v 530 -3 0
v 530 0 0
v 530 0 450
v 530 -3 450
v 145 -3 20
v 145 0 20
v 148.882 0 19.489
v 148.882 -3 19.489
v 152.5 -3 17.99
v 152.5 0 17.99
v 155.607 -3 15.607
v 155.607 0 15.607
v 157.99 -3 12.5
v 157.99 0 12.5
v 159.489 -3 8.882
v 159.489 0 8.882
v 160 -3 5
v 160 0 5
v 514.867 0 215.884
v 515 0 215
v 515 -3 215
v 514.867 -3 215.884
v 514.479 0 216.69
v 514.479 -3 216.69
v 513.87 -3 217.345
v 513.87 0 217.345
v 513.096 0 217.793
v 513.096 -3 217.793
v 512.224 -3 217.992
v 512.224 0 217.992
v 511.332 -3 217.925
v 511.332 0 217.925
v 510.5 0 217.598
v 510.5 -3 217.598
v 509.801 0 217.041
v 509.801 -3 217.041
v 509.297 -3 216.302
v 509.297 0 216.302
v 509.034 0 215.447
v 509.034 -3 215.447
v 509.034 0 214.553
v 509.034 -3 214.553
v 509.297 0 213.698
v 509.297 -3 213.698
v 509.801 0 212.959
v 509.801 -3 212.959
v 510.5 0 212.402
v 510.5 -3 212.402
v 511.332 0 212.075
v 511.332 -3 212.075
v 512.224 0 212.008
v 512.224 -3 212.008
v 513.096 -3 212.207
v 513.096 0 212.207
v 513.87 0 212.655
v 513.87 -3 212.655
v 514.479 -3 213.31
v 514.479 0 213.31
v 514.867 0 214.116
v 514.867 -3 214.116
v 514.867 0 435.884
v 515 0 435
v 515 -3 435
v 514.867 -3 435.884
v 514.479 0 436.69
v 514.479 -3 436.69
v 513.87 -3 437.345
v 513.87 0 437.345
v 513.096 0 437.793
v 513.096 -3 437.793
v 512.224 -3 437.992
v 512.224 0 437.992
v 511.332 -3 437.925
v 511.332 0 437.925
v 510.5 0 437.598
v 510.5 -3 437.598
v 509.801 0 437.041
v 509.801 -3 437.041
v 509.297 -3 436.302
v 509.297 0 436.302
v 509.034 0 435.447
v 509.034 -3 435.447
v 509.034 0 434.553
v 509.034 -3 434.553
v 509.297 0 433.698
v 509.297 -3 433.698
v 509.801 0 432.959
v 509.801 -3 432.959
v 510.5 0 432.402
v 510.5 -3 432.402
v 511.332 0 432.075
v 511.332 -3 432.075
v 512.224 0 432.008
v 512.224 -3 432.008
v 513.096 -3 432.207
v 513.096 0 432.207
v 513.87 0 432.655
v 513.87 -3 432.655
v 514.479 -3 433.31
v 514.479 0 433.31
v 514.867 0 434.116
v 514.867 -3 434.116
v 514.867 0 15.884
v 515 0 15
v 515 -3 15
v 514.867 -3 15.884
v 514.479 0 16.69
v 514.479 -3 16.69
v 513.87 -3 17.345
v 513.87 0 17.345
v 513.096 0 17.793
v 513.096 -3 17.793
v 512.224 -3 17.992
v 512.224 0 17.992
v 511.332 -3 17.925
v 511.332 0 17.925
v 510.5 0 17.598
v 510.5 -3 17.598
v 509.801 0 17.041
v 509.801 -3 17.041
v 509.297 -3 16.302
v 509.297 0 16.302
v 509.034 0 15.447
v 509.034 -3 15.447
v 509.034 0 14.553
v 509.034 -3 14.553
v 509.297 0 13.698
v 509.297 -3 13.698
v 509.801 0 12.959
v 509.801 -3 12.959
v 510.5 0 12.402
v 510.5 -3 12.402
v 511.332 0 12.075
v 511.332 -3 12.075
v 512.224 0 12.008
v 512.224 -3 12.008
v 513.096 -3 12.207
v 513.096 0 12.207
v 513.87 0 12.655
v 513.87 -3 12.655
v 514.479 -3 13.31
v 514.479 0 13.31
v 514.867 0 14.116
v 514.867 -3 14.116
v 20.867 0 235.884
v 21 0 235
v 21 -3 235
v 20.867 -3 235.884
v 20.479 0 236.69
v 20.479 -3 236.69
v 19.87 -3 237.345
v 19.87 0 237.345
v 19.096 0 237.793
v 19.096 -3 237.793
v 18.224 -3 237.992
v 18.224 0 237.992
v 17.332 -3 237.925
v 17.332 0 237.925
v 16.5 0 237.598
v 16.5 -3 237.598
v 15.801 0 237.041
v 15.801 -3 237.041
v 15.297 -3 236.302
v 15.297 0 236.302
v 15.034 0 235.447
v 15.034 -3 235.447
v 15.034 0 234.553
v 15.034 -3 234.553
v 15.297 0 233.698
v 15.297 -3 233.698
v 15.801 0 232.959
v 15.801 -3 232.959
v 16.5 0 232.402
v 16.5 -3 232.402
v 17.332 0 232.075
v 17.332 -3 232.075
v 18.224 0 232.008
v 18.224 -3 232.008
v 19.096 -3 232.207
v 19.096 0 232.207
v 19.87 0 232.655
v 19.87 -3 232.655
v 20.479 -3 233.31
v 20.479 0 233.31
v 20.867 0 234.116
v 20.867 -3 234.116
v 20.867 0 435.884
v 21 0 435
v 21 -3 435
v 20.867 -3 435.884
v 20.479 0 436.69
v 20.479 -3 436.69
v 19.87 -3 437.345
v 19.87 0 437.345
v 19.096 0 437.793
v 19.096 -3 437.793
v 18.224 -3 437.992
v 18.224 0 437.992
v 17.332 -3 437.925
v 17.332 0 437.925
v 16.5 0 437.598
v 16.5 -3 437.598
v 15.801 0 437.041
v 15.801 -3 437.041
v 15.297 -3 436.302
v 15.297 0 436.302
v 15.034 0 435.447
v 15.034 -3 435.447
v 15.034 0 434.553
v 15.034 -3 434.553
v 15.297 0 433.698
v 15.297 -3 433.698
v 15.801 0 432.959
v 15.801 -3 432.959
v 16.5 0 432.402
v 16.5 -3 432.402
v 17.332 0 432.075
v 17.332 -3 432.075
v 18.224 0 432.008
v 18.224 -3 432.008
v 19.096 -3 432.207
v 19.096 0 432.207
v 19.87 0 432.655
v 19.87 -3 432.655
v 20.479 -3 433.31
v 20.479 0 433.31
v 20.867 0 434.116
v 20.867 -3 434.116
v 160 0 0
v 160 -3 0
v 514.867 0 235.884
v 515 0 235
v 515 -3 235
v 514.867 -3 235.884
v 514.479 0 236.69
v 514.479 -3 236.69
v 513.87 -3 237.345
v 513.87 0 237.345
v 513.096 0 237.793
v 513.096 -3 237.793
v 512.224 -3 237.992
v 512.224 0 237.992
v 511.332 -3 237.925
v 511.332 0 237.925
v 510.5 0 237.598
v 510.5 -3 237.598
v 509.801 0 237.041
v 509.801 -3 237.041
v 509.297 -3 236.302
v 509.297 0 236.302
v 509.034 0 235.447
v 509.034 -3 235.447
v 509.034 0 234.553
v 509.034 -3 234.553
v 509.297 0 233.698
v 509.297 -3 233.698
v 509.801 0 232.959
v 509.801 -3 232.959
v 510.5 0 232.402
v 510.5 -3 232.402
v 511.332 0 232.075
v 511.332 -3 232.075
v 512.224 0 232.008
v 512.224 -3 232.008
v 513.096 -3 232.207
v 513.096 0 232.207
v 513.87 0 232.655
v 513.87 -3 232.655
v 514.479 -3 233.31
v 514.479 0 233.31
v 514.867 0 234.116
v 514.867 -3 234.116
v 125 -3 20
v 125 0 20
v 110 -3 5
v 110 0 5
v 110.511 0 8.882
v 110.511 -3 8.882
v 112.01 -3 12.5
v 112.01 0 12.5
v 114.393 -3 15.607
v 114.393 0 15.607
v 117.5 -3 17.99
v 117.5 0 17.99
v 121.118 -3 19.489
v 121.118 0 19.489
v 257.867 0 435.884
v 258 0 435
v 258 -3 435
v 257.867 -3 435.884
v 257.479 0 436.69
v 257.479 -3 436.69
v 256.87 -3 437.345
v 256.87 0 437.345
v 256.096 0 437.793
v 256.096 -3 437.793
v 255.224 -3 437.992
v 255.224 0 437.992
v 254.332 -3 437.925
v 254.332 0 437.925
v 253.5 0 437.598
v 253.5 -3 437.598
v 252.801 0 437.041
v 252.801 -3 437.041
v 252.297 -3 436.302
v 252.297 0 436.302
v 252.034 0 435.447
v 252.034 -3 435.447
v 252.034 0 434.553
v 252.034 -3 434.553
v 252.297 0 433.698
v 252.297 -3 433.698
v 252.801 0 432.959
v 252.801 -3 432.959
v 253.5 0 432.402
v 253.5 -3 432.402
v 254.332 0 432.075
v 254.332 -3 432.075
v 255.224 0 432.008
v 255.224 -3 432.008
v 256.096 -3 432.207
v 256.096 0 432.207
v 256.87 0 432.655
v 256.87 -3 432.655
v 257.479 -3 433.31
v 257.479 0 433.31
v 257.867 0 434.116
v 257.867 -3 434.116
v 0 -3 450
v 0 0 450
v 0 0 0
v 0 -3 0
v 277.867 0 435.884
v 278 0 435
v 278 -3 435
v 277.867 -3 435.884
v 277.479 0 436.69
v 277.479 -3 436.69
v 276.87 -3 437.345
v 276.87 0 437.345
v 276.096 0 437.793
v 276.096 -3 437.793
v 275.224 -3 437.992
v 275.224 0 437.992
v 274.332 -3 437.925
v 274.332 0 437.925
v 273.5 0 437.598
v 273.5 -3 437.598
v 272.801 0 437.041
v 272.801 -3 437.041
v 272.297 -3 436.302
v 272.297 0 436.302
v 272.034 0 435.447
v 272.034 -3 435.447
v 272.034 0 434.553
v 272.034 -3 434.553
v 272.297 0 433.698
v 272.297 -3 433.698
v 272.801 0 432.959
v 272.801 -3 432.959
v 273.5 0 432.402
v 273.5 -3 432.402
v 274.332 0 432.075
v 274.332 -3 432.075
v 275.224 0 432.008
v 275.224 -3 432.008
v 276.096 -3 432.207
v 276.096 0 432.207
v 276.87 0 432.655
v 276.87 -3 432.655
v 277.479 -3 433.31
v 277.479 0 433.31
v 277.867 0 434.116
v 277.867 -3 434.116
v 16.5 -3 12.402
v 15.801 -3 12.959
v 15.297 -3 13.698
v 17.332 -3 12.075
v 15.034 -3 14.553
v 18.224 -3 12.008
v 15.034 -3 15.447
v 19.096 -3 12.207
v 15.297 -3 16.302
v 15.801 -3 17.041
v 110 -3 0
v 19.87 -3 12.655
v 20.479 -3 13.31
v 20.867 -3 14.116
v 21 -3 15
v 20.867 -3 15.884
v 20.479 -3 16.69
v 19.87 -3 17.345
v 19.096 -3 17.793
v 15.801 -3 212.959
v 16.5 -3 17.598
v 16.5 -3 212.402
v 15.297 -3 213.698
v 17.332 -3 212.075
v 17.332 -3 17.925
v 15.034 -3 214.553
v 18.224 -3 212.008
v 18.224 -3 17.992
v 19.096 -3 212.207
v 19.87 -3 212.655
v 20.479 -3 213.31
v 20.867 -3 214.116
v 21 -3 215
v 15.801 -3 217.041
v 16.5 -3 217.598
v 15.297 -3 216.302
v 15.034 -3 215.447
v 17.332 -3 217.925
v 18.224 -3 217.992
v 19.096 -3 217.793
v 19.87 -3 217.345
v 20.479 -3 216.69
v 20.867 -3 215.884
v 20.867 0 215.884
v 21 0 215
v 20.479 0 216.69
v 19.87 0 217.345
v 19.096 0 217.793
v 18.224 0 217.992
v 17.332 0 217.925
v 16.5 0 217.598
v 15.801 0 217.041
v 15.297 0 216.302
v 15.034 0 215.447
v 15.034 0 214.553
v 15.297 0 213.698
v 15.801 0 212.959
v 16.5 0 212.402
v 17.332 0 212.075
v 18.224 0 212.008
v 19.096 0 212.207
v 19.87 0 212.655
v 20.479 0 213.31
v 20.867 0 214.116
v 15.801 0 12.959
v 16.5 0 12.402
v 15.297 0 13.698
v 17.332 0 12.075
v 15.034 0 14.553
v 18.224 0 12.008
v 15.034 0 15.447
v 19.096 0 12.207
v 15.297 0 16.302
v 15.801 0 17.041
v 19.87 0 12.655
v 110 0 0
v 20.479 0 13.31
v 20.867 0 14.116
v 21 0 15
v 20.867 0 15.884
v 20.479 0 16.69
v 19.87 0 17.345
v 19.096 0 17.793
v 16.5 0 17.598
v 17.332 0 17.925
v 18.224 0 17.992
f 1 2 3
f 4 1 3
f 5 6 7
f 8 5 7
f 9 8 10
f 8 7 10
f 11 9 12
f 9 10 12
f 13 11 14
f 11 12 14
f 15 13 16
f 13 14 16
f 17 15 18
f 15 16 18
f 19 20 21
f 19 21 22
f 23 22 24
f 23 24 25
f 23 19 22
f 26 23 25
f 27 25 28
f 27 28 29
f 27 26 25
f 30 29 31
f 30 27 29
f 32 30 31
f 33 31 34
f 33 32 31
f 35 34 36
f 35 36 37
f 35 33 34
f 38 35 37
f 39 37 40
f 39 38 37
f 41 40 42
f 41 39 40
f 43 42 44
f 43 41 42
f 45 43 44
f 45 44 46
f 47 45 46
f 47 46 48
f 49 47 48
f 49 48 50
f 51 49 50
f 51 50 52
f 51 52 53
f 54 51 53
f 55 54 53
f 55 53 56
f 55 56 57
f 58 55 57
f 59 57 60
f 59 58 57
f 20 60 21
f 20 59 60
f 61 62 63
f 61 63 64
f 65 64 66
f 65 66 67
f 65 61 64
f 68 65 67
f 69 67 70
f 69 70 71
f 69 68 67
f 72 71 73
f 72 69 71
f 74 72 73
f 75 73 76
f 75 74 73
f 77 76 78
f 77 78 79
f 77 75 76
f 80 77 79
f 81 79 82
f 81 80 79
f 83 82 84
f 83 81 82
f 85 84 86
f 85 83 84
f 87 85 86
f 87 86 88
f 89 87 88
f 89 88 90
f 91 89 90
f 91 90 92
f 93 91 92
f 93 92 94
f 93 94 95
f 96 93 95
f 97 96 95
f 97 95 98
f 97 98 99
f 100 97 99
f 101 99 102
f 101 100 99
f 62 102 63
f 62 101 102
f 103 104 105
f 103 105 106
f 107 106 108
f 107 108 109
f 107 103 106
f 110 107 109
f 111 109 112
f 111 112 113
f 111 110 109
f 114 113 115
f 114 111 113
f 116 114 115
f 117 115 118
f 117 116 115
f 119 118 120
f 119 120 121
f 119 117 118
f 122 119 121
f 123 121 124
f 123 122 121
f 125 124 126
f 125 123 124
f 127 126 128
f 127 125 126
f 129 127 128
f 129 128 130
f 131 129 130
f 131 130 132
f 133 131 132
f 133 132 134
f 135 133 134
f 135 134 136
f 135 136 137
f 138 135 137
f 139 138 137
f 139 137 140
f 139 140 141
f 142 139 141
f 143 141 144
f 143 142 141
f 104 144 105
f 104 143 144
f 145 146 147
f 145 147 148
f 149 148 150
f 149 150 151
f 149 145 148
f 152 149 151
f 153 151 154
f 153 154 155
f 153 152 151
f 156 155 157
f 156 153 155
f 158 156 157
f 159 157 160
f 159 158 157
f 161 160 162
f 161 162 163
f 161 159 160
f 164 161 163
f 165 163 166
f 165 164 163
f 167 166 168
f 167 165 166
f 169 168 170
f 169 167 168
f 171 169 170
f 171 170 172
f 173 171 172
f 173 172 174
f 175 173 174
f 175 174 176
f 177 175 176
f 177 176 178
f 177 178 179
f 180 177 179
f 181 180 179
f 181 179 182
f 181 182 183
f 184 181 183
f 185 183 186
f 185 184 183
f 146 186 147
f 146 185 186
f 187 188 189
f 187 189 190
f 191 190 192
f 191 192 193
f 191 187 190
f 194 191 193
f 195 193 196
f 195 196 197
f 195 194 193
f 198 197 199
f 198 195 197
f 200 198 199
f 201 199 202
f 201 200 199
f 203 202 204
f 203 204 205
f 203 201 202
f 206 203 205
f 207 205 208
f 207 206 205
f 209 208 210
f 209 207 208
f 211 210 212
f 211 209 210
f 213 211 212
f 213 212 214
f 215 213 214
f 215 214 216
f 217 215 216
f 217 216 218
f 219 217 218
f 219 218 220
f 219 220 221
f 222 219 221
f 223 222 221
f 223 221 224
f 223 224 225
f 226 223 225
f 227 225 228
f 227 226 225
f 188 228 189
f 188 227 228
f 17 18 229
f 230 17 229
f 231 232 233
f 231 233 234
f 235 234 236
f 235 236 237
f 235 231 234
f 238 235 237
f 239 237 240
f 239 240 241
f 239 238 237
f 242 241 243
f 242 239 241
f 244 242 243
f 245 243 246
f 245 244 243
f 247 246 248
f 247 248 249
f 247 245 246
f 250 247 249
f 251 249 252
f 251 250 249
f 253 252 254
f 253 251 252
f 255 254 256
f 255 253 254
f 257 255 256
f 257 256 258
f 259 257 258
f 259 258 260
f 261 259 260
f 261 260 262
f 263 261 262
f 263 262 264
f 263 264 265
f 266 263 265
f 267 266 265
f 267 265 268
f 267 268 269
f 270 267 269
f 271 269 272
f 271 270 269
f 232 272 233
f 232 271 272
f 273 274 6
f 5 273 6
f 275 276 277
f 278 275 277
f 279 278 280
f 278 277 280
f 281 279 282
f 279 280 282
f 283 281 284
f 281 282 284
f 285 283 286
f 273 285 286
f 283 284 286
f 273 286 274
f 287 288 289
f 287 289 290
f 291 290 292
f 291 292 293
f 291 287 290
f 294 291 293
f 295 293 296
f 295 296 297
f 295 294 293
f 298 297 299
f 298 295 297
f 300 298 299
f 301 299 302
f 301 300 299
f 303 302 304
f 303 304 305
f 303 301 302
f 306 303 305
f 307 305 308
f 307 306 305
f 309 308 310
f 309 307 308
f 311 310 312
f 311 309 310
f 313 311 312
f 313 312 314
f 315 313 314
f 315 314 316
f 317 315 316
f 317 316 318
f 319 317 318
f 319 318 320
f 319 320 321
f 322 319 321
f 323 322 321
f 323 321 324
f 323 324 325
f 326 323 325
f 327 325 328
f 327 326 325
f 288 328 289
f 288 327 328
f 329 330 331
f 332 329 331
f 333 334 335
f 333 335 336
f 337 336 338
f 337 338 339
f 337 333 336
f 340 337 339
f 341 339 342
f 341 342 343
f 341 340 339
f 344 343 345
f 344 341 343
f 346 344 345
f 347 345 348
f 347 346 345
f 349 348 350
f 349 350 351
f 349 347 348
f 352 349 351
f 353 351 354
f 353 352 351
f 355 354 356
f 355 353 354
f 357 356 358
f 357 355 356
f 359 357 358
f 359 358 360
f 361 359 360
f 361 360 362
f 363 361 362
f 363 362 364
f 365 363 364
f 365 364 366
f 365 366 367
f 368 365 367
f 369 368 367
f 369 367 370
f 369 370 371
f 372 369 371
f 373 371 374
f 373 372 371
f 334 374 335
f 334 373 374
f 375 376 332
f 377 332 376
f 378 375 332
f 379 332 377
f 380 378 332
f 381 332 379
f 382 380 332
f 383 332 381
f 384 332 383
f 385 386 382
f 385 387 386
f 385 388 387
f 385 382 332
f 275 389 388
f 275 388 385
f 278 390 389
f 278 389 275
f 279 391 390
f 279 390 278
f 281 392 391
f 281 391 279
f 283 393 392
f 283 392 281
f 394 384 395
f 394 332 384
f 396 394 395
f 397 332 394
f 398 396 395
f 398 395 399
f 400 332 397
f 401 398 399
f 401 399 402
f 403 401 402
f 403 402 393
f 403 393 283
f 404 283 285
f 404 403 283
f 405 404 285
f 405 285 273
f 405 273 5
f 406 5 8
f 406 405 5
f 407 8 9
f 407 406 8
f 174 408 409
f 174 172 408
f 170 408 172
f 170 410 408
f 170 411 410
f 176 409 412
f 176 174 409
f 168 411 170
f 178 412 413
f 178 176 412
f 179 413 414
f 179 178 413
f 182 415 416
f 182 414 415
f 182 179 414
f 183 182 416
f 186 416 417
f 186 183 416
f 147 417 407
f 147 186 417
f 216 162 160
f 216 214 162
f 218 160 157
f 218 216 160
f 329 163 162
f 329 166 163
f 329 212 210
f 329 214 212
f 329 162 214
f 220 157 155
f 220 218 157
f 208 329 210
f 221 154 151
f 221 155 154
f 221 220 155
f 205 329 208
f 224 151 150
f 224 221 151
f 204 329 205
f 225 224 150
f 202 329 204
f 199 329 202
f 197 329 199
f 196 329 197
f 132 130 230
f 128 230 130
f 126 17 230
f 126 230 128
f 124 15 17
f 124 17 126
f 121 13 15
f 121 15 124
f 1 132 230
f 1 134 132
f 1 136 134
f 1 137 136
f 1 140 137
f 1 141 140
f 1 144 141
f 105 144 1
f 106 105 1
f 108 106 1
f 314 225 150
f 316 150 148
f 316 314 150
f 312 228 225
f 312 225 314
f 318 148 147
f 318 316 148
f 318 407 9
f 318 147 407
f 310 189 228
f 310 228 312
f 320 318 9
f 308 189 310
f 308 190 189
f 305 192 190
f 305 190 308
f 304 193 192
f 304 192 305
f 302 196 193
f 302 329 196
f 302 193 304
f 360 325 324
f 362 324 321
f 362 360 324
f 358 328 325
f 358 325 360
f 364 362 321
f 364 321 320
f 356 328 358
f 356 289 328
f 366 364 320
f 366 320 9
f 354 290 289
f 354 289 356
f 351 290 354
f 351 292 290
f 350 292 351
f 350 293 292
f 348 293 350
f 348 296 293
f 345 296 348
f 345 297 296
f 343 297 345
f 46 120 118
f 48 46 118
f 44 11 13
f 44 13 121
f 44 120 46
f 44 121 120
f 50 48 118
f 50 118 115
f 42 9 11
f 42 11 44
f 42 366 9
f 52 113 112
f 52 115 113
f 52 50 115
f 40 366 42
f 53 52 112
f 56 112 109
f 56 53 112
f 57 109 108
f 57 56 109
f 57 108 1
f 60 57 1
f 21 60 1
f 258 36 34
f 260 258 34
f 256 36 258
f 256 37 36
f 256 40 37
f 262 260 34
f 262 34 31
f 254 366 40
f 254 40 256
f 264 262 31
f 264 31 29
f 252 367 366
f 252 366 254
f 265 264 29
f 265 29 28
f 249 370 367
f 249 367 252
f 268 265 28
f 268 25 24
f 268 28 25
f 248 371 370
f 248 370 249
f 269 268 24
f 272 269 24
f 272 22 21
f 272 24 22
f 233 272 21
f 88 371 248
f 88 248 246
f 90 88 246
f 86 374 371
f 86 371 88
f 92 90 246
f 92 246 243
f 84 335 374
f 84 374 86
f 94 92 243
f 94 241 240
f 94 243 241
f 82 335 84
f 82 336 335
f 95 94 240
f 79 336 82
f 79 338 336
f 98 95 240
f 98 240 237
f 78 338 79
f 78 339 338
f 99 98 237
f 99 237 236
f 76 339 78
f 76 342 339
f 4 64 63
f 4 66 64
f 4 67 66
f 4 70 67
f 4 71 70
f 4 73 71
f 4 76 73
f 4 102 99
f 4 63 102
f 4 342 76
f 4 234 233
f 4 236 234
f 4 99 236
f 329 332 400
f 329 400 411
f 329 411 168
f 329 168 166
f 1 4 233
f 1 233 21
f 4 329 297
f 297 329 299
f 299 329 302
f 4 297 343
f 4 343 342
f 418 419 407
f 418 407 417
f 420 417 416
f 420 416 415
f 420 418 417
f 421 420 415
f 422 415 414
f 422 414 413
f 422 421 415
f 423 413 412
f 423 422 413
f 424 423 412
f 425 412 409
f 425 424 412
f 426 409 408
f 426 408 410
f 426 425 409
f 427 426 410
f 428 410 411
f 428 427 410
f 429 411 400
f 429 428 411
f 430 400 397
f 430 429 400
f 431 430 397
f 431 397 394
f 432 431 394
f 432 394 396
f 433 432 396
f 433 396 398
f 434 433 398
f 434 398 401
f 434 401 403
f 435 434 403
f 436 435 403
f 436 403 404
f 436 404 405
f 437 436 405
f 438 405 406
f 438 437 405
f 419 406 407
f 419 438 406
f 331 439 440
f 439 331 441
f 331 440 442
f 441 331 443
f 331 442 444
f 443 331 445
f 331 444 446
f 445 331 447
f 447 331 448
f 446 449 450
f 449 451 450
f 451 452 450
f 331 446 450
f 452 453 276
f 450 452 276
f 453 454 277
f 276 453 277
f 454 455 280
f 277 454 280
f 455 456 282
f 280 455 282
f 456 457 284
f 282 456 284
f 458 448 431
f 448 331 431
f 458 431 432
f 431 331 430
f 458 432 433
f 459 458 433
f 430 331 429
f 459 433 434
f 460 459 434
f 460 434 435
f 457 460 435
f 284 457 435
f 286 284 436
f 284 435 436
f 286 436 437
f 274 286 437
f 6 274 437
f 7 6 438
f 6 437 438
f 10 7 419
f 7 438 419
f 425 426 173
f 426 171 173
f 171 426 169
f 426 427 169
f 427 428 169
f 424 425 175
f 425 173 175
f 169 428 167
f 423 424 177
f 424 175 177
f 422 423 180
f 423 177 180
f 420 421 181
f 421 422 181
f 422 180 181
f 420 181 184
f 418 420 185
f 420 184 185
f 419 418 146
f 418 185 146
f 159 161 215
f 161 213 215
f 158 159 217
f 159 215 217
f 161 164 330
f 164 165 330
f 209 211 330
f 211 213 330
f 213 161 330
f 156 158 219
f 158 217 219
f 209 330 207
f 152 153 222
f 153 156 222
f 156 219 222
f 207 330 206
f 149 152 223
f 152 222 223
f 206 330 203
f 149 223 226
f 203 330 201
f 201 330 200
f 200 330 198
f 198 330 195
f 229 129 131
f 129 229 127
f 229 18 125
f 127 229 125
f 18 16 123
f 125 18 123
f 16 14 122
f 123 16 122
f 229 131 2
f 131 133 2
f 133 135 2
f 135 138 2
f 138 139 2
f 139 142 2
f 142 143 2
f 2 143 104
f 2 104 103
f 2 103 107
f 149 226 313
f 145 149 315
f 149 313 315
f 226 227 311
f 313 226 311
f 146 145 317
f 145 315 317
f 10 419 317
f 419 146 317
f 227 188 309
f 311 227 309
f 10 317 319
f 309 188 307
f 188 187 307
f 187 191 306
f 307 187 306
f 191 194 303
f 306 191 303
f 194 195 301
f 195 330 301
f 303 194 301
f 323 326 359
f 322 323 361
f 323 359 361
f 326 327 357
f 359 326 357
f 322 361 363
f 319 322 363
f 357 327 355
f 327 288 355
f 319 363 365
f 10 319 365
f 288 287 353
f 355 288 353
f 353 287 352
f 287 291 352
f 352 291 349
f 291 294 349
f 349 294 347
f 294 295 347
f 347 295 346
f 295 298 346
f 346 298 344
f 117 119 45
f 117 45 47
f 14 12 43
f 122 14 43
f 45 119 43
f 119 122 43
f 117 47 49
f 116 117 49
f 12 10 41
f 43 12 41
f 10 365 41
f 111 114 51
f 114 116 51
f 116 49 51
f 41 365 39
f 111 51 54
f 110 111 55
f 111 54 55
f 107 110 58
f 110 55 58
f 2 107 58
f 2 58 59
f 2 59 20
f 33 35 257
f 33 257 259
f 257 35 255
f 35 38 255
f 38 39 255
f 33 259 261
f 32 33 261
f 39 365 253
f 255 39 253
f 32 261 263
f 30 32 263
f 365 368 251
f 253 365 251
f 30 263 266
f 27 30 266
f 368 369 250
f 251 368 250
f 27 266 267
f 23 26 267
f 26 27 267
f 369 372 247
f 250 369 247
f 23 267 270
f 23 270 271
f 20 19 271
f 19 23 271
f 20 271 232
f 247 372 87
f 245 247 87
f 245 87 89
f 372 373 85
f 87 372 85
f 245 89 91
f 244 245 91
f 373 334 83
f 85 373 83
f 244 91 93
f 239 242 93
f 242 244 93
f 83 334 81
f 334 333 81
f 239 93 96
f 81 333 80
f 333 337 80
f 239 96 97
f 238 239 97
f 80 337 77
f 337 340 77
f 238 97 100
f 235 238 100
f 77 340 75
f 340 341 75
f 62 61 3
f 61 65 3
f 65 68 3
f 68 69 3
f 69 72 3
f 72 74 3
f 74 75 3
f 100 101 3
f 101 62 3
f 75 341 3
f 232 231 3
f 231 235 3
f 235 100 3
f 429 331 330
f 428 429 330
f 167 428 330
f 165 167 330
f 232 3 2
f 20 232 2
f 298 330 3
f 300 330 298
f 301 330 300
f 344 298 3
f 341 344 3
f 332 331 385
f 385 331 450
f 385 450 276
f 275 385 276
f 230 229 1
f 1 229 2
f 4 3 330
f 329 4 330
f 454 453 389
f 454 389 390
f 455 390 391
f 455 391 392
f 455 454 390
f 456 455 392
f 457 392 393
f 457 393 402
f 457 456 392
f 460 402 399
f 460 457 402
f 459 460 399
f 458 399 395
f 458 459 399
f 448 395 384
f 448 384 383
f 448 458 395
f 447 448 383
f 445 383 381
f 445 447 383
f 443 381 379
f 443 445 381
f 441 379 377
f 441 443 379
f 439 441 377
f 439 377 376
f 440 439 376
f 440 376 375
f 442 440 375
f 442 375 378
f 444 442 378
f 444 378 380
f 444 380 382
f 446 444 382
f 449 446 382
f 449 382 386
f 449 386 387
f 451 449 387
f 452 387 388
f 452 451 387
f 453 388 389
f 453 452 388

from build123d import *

# Parameters (mm, degrees)
F0_R     = 3
F1_DEPTH = 3


with BuildPart() as f1:
    # F0 (on Front) → F1 (new body)
    with BuildSketch(Plane.XZ):
        with BuildLine():
            Line((0, 450), (0, 0))
            Line((0, 0), (110, 0))
            Line((110, 0), (110, 5))
            ThreePointArc((110, 5), (114.393398, 15.606602), (125, 20))
            Line((125, 20), (145, 20))
            ThreePointArc((145, 20), (155.606602, 15.606602), (160, 5))
            Line((160, 5), (160, 0))
            Line((160, 0), (530, 0))
            Line((530, 0), (530, 450))
            Line((530, 450), (0, 450))
        make_face()
        with Locations((18, 15)):
            Circle(F0_R, mode=Mode.SUBTRACT)
        with Locations((18, 215)):
            Circle(F0_R, mode=Mode.SUBTRACT)
        with Locations((512, 15)):
            Circle(F0_R, mode=Mode.SUBTRACT)
        with Locations((512, 215)):
            Circle(F0_R, mode=Mode.SUBTRACT)
        with Locations((18, 235)):
            Circle(F0_R, mode=Mode.SUBTRACT)
        with Locations((18, 435)):
            Circle(F0_R, mode=Mode.SUBTRACT)
        with Locations((255, 435)):
            Circle(F0_R, mode=Mode.SUBTRACT)
        with Locations((512, 235)):
            Circle(F0_R, mode=Mode.SUBTRACT)
        with Locations((275, 435)):
            Circle(F0_R, mode=Mode.SUBTRACT)
        with Locations((512, 435)):
            Circle(F0_R, mode=Mode.SUBTRACT)
    extrude(amount=F1_DEPTH)


solid = f1.part
